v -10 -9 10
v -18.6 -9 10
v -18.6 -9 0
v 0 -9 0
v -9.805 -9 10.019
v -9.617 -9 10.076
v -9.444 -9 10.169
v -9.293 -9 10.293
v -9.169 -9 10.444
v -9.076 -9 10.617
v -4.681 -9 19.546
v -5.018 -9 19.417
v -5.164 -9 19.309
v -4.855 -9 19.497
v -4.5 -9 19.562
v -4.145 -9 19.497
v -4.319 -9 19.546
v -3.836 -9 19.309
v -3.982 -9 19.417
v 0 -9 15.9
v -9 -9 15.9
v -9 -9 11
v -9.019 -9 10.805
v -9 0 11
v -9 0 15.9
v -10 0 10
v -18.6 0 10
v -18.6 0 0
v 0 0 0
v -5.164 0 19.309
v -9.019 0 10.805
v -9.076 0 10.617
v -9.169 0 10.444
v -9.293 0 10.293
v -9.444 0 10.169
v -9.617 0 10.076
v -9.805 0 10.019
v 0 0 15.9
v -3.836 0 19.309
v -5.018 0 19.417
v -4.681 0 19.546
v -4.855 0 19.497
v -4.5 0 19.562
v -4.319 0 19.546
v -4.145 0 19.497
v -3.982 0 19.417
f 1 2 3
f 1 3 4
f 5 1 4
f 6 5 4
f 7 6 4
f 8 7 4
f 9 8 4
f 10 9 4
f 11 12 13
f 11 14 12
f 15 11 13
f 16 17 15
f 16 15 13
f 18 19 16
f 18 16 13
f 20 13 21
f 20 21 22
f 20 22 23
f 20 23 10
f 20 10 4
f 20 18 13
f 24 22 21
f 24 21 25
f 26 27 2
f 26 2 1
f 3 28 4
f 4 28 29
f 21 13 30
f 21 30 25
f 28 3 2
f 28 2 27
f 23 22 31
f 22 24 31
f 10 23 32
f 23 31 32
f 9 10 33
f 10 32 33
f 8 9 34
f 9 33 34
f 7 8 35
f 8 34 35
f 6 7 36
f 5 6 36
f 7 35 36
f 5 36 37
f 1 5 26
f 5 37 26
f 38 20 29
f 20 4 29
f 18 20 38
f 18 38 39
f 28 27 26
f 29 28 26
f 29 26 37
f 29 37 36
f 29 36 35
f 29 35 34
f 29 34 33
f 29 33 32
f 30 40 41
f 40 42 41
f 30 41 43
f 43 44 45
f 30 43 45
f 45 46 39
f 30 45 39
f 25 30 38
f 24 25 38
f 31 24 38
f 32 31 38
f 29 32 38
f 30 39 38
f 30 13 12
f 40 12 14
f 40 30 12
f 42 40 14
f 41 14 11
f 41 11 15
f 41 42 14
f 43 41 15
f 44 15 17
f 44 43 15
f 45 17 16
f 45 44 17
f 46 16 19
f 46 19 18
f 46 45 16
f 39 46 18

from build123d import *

# Parameters (mm, degrees)
F0_W     = 18.6
F0_H     = 9
F1_DEPTH = 10
F2_W     = 9
F2_H     = 9
F3_DEPTH = 5.9
F5_DEPTH = 9
F6_R     = 1


with BuildPart() as f1:
    # F0 (on Top) → F1 (new body)
    with BuildSketch(Plane.XY):
        with Locations((-9.3, -4.5)):
            Rectangle(F0_W, F0_H)
    extrude(amount=F1_DEPTH)

    # F2 (on face) → F3 (join)
    with BuildSketch(Plane.XY.offset(10)):
        with Locations((-4.5, -4.5)):
            Rectangle(F2_W, F2_H)
    extrude(amount=F3_DEPTH)

    # F4 (on face) → F5 (join, through all)
    with BuildSketch(Plane.XZ.offset(9)):
        Polygon((-4.5, 19.9), (-9, 15.9), (0, 15.9), align=None)
    extrude(amount=-F5_DEPTH)

    # F6
    f6_edges = [f1.edges().sort_by_distance(p)[0] for p in [
        (-4.5, -4.5, 19.9),
        (-9, -4.5, 10),
    ]]
    fillet(f6_edges, radius=F6_R)


solid = f1.part
